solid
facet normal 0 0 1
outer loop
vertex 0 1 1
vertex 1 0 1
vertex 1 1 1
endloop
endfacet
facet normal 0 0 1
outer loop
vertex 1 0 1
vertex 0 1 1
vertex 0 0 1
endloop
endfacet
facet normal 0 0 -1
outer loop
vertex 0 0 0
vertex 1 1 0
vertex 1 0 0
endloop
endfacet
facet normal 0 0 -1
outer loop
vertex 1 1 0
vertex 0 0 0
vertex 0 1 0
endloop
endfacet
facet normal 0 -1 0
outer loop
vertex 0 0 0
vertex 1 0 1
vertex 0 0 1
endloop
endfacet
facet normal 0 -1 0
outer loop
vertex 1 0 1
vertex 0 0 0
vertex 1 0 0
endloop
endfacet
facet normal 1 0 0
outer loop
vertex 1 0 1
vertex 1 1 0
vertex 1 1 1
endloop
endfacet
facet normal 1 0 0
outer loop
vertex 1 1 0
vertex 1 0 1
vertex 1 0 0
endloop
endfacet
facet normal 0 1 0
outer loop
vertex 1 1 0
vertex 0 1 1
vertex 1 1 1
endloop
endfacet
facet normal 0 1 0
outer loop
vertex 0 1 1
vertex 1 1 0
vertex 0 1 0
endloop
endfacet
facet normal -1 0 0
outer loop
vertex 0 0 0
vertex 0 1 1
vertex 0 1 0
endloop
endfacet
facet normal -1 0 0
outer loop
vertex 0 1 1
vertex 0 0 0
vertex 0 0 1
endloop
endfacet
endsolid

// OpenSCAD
// file: config.scad
// config.scad — single source of truth for every physical dimension
// used across modules/. Status tags match docs/PROJECT-SPEC.md's
// Parameters table: MEASURED (trust it), SOURCE (verify with calipers
// before printing), MEASURE (blocked, no real value exists yet).

// Connector geometry — DECIDED, shared across all modules
tab_width           = 9;     // mm, spec range 8-10mm
tab_depth           = 3.5;   // mm, spec range 3-4mm
tab_clearance       = 0.175; // mm per side, spec range 0.15-0.2mm
base_plinth_height  = 8;     // mm, shared plinth height across all modules

// Physical measurements
bottle_diameter = 26;    // mm — SOURCE: LITKO Game Accessories manufacturer
                          // fit table (litko.net/pages/paint-racks) — 26mm
                          // hole fits Vallejo 17-18ml, Army Painter
                          // Warpaints/Fanatic/Speedpaint, AK Interactive 3rd
                          // Gen, Scale75, Reaper MSP, Two Thin Coats
                          // (bottles "about 25mm across"). Replaces an
                          // earlier 28mm single-listing (Vallejo 20ml) proxy.
well_clearance  = 0.75;  // mm per side — SOURCE: community guidance range
                          // 0.5-1mm for a bottle pulled in/out by hand, vs.
                          // tab_clearance's 0.15-0.2mm which is tuned for a
                          // printed-in-place snap connector. Wells use this,
                          // never tab_clearance.
handle_width    = 10;    // mm — MEASURED: user's brush set
brush_length    = 220;   // mm — MEASURED: user's brush set
marker_diameter = undef; // MEASURE: no marker product selected yet — blocks modules/marker_holders.scad
// main file
// config_test.scad — renders nothing, just proves config.scad parses
// and every constant this plan depends on is actually defined.
include <config.scad>

assert(is_num(tab_width));
assert(is_num(tab_depth));
assert(is_num(tab_clearance));
assert(is_num(base_plinth_height));
assert(is_num(bottle_diameter));
assert(is_num(well_clearance));
assert(is_num(handle_width));
assert(is_num(brush_length));
assert(is_undef(marker_diameter), "marker_diameter should still be undef until markers are measured");

echo("config.scad OK");
cube([1, 1, 1]);
